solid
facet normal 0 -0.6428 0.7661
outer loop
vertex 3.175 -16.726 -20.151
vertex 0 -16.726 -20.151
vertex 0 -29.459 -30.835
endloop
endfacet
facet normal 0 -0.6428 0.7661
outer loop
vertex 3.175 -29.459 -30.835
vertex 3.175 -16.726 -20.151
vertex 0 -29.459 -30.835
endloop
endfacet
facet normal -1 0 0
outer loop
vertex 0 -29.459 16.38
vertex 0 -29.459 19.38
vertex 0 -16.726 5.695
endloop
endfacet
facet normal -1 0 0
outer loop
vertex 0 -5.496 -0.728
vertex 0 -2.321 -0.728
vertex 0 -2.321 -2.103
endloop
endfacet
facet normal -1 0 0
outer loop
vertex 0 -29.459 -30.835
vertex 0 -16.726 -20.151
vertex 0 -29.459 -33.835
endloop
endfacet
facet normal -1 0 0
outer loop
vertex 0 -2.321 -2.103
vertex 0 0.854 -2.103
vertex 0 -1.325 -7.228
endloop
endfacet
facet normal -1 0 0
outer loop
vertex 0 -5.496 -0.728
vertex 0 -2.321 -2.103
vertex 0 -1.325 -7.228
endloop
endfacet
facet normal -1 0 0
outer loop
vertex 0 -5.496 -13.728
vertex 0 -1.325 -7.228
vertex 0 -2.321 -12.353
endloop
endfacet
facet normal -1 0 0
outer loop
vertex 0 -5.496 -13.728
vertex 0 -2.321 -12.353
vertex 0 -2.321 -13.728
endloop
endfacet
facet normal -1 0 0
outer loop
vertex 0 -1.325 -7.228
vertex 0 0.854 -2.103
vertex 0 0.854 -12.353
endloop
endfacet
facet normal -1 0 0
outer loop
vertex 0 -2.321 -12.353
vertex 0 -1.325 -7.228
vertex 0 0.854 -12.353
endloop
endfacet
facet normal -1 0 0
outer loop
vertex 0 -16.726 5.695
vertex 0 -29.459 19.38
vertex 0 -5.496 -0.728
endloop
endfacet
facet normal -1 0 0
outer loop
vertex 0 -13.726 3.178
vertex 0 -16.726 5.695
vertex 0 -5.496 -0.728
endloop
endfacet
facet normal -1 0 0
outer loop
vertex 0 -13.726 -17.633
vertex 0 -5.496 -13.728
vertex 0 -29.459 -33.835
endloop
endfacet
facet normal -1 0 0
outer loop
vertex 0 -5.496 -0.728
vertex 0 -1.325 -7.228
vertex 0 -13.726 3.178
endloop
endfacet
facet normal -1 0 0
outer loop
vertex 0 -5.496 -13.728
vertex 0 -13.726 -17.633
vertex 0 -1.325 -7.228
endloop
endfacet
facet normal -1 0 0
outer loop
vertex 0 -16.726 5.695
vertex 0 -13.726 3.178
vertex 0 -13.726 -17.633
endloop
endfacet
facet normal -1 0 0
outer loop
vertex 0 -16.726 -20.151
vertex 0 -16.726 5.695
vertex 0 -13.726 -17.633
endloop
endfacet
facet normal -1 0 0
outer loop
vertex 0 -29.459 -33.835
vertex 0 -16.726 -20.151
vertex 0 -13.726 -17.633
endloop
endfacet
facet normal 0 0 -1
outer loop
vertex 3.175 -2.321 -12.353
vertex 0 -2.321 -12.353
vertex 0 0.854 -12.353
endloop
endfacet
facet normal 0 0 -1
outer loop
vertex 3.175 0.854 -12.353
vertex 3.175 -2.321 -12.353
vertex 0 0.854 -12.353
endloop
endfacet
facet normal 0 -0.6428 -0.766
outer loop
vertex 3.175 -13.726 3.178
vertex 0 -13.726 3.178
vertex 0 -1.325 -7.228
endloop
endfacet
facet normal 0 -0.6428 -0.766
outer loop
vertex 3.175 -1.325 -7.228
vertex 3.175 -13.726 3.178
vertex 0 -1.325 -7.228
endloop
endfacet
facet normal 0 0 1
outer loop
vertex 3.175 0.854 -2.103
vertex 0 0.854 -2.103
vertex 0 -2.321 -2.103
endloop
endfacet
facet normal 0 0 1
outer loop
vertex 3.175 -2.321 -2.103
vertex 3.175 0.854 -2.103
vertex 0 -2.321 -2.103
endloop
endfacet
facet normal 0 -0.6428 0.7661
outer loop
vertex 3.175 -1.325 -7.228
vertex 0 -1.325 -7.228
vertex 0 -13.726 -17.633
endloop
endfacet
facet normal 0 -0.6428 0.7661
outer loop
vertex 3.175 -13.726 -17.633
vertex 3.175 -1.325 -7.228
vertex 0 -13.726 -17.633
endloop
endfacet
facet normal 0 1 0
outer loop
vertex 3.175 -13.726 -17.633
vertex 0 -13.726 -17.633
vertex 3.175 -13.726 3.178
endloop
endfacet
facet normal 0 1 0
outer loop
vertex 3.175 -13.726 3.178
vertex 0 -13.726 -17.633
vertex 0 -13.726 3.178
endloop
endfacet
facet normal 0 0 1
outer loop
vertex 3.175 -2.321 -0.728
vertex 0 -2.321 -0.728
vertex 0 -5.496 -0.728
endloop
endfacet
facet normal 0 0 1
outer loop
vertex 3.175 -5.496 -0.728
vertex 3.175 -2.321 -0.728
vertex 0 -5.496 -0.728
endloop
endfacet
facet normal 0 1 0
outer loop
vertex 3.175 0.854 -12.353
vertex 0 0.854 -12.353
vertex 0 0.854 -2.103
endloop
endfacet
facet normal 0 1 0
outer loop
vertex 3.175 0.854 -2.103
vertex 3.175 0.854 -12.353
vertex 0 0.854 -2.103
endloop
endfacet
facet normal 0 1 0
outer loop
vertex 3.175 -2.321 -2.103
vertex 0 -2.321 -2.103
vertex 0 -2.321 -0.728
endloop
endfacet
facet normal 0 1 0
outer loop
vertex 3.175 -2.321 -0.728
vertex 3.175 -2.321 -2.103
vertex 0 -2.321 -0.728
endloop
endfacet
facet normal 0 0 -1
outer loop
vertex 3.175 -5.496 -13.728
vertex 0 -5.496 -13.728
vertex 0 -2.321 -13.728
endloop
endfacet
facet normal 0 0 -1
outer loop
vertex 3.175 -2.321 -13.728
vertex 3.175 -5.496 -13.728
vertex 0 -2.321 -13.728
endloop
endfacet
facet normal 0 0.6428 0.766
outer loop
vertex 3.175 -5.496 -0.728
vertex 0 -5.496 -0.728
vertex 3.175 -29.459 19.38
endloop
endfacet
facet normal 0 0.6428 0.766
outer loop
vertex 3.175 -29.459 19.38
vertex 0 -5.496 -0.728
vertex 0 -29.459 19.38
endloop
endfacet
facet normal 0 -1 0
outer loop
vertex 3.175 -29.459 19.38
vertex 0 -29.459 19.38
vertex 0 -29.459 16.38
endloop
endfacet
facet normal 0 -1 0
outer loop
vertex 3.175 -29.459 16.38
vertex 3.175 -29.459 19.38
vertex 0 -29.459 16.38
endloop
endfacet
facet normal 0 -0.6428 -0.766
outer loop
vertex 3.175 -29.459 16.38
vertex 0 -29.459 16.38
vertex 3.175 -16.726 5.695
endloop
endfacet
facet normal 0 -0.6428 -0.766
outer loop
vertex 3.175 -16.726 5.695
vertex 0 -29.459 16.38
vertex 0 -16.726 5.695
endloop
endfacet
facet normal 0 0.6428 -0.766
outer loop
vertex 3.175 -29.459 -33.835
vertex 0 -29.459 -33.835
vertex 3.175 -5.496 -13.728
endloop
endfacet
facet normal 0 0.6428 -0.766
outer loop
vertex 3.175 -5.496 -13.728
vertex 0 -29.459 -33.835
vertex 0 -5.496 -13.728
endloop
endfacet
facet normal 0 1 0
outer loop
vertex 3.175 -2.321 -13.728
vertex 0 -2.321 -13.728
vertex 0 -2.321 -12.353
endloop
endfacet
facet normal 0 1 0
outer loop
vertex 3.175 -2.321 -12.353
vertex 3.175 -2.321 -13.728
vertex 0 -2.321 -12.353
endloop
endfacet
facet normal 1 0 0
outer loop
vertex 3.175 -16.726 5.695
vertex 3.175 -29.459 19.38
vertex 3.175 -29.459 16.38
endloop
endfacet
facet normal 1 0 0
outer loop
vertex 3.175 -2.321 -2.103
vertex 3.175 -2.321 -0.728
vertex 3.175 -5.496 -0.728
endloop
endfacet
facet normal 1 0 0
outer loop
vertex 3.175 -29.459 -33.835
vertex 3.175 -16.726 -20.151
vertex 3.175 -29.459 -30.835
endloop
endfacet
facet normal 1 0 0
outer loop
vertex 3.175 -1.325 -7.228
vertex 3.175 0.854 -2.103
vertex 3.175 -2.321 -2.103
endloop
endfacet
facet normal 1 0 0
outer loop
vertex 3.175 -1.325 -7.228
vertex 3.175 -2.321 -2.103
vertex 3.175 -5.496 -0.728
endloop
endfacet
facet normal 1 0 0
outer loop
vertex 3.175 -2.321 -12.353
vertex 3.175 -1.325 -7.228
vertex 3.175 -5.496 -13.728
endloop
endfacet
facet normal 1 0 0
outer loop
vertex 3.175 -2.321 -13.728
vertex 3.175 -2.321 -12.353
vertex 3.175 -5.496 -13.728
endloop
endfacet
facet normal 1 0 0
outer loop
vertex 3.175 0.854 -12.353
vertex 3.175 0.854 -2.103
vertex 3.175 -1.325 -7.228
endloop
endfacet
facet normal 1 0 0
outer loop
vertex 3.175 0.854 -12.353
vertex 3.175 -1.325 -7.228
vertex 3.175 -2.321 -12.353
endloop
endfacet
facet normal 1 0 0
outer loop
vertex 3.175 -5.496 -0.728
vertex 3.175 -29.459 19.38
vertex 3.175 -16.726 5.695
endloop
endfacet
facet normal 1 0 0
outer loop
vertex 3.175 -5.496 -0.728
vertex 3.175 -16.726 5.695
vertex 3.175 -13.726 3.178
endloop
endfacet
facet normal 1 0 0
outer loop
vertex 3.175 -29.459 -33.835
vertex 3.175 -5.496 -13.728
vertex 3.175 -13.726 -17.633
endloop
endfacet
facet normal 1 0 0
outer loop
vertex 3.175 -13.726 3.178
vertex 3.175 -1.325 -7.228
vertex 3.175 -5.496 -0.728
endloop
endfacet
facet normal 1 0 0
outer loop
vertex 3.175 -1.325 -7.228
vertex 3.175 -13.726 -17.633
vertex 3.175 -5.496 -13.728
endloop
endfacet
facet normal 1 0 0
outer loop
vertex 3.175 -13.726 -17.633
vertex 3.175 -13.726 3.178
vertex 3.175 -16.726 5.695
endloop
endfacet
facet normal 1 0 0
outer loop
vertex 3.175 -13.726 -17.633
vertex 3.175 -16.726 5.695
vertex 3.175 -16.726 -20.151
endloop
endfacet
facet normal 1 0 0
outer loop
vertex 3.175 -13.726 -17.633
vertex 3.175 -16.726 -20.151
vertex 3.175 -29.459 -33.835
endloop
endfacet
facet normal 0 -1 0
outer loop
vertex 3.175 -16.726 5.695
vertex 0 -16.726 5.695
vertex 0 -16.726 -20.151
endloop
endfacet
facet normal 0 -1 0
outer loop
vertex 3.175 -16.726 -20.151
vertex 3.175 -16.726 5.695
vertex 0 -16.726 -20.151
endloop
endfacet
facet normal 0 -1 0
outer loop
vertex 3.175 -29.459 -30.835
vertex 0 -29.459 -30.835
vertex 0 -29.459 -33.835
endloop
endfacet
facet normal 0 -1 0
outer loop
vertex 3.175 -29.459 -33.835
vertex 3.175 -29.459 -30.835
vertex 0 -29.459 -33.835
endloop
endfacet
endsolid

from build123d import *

# Parameters (mm, degrees)
BOSS_EXTRUDE2_DEPTH = 3.175


with BuildPart() as part:
    # Sketch1 → Boss-Extrude2 (new body)
    with BuildSketch(Plane(origin=(0, 0, 0), x_dir=(0, 0, -1), z_dir=(1, 0, 0))):
        Polygon((0.727545577, -5.496236961), (-19.379740188, -29.459167008), (-16.379740188, -29.459167008), (-5.695435338, -16.726108319), (20.150526491, -16.726108319), (30.834831341, -29.459167008), (33.834831341, -29.459167008), (13.727545577, -5.496236961), (13.727545577, -2.321236961), (12.352545577, -2.321236961), (12.352545577, 0.853763039), (2.102545577, 0.853763039), (2.102545577, -2.321236961), (0.727545577, -2.321236961), align=None)
        Polygon((7.227545577, -1.325099387), (17.633227598, -13.726108319), (-3.178136444, -13.726108319), align=None, mode=Mode.SUBTRACT)
    extrude(amount=BOSS_EXTRUDE2_DEPTH)


solid = part.part
